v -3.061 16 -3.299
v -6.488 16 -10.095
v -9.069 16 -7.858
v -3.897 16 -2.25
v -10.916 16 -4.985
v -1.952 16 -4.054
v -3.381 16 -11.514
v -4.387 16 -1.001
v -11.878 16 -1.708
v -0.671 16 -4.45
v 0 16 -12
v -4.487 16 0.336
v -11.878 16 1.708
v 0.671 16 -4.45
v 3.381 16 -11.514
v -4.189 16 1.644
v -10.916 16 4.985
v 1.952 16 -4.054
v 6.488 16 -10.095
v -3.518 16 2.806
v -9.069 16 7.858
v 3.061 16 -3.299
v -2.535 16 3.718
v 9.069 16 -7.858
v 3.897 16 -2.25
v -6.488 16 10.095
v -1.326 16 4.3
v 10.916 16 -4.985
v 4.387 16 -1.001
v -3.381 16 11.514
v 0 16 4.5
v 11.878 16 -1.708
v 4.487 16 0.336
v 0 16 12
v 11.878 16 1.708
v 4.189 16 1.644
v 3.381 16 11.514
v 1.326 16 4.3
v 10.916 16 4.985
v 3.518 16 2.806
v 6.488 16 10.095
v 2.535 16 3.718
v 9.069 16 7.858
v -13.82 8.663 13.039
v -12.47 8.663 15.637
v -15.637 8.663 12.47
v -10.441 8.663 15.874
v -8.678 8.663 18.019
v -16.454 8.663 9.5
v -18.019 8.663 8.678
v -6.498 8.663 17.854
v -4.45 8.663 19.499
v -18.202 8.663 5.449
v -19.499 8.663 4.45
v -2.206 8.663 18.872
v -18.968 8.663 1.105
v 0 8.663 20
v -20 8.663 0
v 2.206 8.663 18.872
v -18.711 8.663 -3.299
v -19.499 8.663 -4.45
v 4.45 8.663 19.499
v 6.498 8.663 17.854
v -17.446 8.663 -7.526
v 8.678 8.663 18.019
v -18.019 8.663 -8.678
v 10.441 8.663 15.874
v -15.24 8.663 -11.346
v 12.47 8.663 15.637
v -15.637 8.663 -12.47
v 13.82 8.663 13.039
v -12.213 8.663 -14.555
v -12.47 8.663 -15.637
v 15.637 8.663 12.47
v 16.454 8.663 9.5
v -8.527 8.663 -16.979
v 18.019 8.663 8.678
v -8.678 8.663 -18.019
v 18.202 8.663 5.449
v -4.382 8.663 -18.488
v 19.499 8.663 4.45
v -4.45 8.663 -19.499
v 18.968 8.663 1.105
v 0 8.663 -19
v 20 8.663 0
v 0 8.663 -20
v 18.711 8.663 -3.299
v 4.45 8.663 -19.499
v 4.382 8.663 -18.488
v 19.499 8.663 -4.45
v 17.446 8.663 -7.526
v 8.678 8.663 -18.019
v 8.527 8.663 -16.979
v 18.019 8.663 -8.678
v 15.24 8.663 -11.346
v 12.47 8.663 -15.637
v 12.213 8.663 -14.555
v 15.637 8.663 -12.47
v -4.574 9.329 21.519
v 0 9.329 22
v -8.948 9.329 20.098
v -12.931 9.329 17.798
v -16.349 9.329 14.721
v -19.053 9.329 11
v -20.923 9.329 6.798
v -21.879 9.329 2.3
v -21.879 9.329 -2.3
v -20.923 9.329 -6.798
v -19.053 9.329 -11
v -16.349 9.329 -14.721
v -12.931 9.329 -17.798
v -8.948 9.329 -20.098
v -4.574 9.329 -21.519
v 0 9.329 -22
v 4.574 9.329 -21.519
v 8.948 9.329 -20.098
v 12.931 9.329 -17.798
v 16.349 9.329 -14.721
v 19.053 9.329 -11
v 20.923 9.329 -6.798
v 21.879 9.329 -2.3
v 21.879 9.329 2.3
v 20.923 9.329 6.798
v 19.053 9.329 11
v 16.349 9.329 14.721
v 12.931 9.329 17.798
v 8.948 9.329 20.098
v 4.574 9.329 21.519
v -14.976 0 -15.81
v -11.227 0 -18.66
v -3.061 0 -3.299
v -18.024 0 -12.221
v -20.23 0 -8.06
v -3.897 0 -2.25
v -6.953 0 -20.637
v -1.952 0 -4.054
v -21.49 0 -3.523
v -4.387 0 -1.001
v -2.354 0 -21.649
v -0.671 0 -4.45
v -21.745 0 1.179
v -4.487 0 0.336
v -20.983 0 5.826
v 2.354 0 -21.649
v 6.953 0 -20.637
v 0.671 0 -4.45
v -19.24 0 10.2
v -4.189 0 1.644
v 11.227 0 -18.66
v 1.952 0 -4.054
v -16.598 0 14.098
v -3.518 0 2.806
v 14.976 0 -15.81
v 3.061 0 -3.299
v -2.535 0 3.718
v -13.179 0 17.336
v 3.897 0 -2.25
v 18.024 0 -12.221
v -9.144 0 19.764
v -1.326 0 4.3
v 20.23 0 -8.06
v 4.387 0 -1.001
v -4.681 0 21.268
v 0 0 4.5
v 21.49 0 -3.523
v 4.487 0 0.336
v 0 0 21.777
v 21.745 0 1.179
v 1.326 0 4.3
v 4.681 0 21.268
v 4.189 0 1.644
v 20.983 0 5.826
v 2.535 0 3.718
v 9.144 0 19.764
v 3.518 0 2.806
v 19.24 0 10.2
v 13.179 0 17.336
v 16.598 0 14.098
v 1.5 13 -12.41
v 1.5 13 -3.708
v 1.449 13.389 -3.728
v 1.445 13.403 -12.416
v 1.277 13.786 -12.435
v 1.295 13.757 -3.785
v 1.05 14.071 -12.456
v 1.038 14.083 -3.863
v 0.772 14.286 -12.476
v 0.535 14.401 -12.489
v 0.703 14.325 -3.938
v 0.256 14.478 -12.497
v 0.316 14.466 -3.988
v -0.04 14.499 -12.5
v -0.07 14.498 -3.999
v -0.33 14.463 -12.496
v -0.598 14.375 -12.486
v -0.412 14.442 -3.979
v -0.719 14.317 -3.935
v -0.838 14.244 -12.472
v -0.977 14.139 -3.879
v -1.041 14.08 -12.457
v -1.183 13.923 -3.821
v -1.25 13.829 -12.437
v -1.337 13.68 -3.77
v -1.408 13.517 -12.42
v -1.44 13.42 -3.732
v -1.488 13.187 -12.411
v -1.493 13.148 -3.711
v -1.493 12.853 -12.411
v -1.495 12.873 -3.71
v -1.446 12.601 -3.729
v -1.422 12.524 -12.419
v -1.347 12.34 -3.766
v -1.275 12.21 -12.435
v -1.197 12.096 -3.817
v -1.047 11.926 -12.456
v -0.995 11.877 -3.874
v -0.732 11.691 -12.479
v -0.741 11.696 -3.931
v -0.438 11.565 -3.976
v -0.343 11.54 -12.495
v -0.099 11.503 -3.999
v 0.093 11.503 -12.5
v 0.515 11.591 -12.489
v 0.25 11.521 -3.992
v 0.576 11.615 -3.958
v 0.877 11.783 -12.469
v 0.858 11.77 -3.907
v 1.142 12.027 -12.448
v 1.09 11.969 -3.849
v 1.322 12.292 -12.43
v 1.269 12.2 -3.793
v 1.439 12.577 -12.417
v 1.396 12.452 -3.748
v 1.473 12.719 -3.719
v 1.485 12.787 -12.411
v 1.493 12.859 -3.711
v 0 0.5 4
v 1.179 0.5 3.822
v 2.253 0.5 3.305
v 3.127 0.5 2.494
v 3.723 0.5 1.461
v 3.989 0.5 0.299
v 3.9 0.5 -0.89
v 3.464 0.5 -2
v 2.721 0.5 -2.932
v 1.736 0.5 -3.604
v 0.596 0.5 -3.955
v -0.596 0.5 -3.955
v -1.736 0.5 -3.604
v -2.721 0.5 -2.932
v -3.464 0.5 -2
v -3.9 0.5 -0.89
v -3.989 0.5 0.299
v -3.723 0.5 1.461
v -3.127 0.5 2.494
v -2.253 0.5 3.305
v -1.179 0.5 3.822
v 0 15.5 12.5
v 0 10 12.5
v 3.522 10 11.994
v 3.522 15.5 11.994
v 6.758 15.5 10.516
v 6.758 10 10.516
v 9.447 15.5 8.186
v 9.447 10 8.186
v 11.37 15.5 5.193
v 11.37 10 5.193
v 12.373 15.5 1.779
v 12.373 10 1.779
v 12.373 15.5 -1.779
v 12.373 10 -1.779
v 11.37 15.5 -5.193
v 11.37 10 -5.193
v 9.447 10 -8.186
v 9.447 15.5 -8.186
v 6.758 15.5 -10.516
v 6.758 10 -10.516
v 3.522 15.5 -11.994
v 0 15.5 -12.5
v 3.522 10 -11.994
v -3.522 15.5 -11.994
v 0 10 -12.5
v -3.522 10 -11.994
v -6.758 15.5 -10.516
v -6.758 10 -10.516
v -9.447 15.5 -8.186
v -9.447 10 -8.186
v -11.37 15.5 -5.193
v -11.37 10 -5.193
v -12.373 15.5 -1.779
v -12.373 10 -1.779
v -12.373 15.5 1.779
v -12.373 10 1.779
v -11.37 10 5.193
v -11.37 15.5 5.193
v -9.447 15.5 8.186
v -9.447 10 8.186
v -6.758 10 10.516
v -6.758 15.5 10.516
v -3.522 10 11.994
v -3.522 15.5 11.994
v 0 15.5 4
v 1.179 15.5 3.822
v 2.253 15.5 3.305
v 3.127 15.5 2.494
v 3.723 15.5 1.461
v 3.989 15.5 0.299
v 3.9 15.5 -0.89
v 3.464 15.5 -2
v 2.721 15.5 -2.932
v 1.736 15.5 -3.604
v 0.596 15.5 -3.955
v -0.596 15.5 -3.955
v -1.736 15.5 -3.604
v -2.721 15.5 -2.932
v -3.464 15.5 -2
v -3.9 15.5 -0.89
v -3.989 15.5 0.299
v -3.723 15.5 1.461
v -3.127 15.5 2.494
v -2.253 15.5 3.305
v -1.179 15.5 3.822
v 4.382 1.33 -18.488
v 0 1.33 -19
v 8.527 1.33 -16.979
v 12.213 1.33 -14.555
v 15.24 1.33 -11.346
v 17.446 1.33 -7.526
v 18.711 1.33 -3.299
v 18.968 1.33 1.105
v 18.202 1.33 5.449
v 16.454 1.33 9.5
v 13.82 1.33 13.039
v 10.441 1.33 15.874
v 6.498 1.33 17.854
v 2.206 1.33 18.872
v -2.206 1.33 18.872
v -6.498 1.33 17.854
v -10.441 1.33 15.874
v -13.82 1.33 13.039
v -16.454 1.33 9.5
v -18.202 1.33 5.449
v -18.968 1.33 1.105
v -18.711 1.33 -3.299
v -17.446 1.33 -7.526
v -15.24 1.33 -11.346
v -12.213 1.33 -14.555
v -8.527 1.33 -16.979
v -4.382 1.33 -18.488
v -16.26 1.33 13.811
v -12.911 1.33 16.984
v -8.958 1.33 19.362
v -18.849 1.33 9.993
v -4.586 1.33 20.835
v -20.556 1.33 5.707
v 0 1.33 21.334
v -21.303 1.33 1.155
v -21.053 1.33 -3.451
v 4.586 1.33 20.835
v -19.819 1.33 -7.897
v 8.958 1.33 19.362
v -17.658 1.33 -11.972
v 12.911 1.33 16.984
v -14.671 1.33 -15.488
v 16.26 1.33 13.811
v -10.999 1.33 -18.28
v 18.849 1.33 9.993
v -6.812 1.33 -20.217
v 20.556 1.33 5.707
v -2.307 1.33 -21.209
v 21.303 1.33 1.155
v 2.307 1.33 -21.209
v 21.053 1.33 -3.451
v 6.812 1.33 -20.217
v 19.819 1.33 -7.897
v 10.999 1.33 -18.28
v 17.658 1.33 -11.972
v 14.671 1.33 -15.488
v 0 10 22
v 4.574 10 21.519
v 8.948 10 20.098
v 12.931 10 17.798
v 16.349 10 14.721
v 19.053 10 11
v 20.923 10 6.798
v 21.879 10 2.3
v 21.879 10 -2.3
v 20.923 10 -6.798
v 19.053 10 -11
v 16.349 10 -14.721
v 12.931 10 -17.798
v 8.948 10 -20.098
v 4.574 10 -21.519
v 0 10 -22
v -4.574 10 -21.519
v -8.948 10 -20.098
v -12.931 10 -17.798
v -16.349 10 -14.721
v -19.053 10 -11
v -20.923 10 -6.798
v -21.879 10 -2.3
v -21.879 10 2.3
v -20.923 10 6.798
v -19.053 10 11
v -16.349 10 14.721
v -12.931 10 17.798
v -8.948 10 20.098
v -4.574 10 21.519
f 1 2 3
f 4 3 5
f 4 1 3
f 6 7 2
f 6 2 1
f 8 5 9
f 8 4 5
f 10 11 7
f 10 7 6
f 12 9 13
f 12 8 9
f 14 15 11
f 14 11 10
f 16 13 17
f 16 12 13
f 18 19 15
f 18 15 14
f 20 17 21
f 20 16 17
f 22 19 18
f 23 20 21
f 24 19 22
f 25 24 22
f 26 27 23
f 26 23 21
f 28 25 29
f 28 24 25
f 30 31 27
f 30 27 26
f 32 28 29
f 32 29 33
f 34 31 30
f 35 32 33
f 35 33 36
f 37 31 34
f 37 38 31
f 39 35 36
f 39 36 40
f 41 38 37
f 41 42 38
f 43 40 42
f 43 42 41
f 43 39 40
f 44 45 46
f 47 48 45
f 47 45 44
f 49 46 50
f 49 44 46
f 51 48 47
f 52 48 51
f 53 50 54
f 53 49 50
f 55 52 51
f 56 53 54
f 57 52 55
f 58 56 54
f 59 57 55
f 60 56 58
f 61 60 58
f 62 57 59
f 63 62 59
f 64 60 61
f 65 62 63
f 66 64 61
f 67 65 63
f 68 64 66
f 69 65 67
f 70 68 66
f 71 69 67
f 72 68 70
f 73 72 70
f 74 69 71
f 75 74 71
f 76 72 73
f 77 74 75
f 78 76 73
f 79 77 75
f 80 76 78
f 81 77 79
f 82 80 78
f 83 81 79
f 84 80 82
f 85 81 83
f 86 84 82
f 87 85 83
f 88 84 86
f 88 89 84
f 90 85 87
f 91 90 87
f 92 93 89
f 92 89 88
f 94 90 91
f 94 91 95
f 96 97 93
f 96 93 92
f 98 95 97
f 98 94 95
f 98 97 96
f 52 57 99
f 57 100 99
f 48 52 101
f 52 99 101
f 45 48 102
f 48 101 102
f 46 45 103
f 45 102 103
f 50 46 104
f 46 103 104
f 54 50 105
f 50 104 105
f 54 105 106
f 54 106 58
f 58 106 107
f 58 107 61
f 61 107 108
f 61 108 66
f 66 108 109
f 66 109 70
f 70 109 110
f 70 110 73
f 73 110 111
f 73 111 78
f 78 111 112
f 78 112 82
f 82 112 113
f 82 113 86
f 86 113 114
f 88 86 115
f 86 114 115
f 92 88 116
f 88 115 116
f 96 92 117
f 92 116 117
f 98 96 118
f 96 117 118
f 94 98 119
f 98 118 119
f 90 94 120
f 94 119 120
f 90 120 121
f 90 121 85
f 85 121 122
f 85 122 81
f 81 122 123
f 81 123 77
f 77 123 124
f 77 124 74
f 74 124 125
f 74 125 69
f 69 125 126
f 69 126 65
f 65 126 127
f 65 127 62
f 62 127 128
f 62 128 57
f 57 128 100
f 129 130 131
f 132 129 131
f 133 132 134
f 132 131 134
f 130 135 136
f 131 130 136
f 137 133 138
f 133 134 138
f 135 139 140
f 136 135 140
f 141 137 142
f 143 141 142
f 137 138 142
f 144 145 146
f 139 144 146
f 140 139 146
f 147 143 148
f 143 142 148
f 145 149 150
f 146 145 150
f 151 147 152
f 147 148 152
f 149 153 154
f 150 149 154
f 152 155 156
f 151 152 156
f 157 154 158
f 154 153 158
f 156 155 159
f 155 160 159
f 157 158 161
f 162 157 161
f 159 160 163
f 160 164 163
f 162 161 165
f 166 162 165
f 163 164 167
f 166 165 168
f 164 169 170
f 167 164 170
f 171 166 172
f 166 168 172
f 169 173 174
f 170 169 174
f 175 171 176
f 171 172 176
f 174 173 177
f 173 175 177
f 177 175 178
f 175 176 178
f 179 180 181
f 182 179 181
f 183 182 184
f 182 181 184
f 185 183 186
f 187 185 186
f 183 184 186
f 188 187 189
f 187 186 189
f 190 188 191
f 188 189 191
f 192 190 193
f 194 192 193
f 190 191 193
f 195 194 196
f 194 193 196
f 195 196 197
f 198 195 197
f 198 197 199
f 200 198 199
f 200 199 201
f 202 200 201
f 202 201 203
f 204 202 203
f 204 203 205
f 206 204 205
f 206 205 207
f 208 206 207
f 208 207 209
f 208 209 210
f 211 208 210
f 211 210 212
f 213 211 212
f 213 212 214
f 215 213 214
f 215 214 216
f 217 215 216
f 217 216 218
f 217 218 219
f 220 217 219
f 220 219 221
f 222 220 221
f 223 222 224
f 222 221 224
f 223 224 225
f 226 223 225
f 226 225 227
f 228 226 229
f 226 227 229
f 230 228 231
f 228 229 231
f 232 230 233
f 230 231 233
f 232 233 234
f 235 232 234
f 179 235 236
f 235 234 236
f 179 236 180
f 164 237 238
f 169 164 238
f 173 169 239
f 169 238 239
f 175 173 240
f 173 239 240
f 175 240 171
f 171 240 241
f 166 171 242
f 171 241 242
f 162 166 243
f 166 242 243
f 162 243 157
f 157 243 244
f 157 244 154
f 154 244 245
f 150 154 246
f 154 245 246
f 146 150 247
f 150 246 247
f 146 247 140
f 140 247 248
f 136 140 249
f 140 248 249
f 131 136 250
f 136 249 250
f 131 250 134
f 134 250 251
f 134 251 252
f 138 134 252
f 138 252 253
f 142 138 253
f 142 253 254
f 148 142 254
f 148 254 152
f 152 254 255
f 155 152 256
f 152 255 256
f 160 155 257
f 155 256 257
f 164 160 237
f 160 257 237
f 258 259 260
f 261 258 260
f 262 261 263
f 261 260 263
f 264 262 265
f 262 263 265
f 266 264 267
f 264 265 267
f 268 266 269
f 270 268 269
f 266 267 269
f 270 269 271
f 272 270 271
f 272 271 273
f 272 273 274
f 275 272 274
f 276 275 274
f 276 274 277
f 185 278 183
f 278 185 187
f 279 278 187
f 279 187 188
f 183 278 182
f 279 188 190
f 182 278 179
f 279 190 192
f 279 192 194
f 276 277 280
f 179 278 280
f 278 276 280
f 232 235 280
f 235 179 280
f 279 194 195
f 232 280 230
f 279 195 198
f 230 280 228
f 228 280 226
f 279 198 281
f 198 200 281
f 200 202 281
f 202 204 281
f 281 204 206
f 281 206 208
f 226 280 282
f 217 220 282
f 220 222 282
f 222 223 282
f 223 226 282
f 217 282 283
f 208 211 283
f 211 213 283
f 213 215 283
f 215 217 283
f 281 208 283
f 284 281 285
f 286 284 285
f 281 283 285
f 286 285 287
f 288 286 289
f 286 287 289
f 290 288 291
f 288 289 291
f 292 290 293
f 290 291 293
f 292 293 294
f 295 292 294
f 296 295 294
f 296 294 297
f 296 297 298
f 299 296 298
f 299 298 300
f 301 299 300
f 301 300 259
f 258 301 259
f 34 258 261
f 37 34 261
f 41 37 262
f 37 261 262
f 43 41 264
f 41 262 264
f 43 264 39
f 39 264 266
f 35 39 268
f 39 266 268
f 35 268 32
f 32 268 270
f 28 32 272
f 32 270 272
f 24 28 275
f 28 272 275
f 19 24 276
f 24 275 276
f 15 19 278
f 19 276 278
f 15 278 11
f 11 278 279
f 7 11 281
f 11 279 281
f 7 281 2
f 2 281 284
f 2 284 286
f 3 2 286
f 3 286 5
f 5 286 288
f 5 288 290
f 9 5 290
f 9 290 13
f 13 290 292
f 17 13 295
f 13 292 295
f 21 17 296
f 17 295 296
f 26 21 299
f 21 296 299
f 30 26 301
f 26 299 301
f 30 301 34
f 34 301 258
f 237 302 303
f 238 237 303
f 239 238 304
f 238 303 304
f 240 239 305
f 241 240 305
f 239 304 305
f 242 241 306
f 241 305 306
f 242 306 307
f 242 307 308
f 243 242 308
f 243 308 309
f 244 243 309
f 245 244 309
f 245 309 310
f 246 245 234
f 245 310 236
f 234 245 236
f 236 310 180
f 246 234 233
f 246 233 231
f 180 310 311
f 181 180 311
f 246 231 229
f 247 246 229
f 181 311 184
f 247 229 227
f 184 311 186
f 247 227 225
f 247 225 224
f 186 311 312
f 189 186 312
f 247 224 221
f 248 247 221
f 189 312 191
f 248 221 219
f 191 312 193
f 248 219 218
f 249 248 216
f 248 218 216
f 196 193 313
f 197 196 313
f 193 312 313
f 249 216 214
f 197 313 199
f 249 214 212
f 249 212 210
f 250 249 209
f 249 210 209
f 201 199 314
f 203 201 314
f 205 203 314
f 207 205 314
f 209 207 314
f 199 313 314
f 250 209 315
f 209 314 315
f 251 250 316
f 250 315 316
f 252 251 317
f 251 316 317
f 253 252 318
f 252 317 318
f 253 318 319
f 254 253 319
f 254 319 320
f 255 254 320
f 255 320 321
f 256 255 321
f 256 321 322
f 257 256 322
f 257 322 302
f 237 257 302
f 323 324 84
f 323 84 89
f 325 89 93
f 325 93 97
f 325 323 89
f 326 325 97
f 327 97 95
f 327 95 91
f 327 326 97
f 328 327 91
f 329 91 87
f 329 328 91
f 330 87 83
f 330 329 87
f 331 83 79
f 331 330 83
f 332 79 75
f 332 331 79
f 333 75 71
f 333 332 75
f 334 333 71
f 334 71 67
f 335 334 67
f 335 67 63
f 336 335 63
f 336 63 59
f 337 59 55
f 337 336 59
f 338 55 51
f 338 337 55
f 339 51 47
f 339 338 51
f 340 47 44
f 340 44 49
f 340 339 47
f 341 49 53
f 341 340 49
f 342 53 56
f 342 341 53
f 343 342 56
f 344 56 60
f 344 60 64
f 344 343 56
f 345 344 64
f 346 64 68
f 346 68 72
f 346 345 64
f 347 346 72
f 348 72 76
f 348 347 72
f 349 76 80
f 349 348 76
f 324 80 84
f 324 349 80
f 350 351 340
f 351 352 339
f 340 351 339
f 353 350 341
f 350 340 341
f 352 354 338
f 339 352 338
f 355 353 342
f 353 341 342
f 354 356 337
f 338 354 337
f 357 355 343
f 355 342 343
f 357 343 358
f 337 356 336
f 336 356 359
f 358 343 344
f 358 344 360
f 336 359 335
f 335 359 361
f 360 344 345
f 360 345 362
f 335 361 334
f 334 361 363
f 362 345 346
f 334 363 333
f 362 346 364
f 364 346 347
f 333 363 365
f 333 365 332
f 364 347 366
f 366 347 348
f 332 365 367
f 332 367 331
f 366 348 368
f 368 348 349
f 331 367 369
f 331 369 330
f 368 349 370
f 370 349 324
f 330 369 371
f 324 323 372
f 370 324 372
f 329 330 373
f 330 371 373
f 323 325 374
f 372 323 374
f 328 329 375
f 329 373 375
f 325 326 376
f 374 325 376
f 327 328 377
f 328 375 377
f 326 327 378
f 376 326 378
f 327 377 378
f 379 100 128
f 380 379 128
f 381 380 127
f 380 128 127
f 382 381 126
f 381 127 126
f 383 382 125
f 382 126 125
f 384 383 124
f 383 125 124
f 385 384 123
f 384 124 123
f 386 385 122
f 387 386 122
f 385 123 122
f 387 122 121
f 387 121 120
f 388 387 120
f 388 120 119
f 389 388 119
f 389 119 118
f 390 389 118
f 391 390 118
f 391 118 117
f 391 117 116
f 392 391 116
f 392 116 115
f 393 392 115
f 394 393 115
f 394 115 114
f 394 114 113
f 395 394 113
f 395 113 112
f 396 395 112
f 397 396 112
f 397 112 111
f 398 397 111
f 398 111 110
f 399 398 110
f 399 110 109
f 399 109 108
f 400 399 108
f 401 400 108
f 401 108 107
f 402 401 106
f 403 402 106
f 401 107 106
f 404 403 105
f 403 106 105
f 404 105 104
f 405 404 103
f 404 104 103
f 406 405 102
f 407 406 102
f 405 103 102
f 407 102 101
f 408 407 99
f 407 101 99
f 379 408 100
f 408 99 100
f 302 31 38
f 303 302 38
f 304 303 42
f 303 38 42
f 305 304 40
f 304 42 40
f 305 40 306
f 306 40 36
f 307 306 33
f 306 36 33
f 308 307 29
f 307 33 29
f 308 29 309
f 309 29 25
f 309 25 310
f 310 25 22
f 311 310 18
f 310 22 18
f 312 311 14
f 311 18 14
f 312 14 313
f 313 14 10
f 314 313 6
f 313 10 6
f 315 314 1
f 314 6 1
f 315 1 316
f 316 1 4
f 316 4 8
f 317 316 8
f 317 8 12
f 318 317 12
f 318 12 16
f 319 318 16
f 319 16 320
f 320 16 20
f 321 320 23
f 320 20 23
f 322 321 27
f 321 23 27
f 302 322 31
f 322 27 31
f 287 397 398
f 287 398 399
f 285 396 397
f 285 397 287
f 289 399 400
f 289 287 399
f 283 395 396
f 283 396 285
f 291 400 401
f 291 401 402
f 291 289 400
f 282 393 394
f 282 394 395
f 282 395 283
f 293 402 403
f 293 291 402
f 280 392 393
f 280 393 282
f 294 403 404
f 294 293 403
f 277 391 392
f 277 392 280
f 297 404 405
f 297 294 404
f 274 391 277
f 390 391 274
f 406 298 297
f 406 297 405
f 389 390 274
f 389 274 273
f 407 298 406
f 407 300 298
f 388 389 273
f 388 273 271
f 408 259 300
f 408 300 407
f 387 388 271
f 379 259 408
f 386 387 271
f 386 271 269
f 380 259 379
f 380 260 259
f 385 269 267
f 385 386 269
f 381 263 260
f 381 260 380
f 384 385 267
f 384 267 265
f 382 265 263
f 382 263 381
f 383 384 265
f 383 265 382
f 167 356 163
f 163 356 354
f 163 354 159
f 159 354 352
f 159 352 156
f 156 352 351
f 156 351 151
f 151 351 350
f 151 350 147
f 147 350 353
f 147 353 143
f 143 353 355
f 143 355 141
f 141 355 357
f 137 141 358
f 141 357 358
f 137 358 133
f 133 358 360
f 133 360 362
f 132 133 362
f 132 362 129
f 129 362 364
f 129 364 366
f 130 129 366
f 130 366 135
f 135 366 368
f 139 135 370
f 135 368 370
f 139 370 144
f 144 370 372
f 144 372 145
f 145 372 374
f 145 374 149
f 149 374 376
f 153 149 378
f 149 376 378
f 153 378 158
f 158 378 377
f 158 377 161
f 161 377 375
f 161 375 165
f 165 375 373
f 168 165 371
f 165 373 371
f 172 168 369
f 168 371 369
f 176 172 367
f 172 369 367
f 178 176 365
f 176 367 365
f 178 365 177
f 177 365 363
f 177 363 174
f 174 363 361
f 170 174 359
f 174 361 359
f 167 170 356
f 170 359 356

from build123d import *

# Parameters (mm, degrees)
SKETCH1_R               = 22
BOSS_EXTRUDE1_DEPTH     = 10
SKETCH2_R               = 12.5
BOSS_EXTRUDE2_DEPTH     = 6
CUT_EXTRUDE1_REACH      = 36.986
CUT_EXTRUDE1_END_RADIUS = 12.5
SKETCH3_R               = 1.5
CUT_EXTRUDE2_REACH      = 36.986
SKETCH4_R               = 4
CUT_EXTRUDE3_START      = -1.33
SKETCH5_R               = 22
SKETCH5_R_2             = 19
CUT_EXTRUDE3_DEPTH      = 7.33333
CHAMFER1_SIZE           = 2
CHAMFER1_SIZE_2         = 0.666
CHAMFER2_SIZE           = 0.5


with BuildPart() as part:
    # Sketch1 → Boss-Extrude1 (new body)
    with BuildSketch(Plane(origin=(0, 0, 0), x_dir=(1, 0, 0), z_dir=(0, 1, 0))):
        with Locations(Location((0, 0, 0), (0, 0, 270))):
            Circle(SKETCH1_R)
    extrude(amount=BOSS_EXTRUDE1_DEPTH)

    # Sketch2 → Boss-Extrude2 (add)
    with BuildSketch(Plane(origin=(0, 10, 0), x_dir=(1, 0, 0), z_dir=(0, 1, 0))):
        with Locations(Location((0, 0, 0), (0, 0, 270))):
            Circle(SKETCH2_R)
    extrude(amount=BOSS_EXTRUDE2_DEPTH)

    # Cut-Extrude1: up to this cylinder (the profile starts inside it)
    cut_extrude1_end = Plane(origin=(0, 13, 0), z_dir=(0, -1, 0)) * Cylinder(CUT_EXTRUDE1_END_RADIUS, 99.972, mode=Mode.PRIVATE)
    # Sketch3 → Cut-Extrude1 (cut, up to the surface)
    with BuildSketch(Plane.XY, mode=Mode.PRIVATE) as cut_extrude1_sk1:
        with Locations((0, 13)):
            Circle(SKETCH3_R)
    cut_extrude1_tool1 = extrude(cut_extrude1_sk1.sketch, amount=-CUT_EXTRUDE1_REACH, mode=Mode.PRIVATE) & cut_extrude1_end
    add(cut_extrude1_tool1.solids().sort_by_distance((0, 13, 0))[0], mode=Mode.SUBTRACT)

    # Sketch4 → Cut-Extrude2 (cut, up to next)
    with BuildSketch(Plane(origin=(0, 16, 0), x_dir=(1, 0, 0), z_dir=(0, 1, 0)), mode=Mode.PRIVATE) as cut_extrude2_sk1:
        with Locations(Location((0, 0, 0), (0, 0, 270))):
            Circle(SKETCH4_R)
    cut_extrude2_tool1 = extrude(cut_extrude2_sk1.sketch, amount=-CUT_EXTRUDE2_REACH, mode=Mode.PRIVATE) & part.part
    add(cut_extrude2_tool1.solids().sort_by_distance((0, 16, 0))[0], mode=Mode.SUBTRACT)

    # Sketch5 → Cut-Extrude3 (cut)
    with BuildSketch(Plane.XZ.offset(CUT_EXTRUDE3_START)):
        with Locations(Location((0, 0, 0), (0, 0, 270))):
            Circle(SKETCH5_R)
        with Locations(Location((0, 0, 0), (0, 0, 270))):
            Circle(SKETCH5_R_2, mode=Mode.SUBTRACT)
    extrude(amount=-CUT_EXTRUDE3_DEPTH, mode=Mode.SUBTRACT)

    # Chamfer1
    # the kernel refuses this chamfer: 2, 0.666 mm, written as the material it takes off along each edge
    with BuildSketch(Plane(origin=(0, 1.33, 0), x_dir=(0, 0, 1), z_dir=(1, 0, 0))) as chamfer1_piece_1:
        Polygon((22, CHAMFER1_SIZE), (22 - CHAMFER1_SIZE_2, 0), (22, 0), align=None)
    revolve(axis=Axis((0, 1.33, 0), (0, -1, 0)), mode=Mode.SUBTRACT)
    with BuildSketch(Plane(origin=(0, 8.66333, 0), x_dir=(0, 0, 1), z_dir=(1, 0, 0))) as chamfer1_piece_2:
        Polygon((22 - CHAMFER1_SIZE, 0), (22, -CHAMFER1_SIZE_2), (22, 0), align=None)
    revolve(axis=Axis((0, 8.66333, 0), (0, -1, 0)), mode=Mode.SUBTRACT)

    # Chamfer2
    chamfer2_edges = [part.edges().sort_by_distance(p)[0] for p in [
        (0, 16, -4),
        (0, 0, -4),
        (0, 16, -12.5),
    ]]
    chamfer(chamfer2_edges, length=CHAMFER2_SIZE)


solid = part.part
